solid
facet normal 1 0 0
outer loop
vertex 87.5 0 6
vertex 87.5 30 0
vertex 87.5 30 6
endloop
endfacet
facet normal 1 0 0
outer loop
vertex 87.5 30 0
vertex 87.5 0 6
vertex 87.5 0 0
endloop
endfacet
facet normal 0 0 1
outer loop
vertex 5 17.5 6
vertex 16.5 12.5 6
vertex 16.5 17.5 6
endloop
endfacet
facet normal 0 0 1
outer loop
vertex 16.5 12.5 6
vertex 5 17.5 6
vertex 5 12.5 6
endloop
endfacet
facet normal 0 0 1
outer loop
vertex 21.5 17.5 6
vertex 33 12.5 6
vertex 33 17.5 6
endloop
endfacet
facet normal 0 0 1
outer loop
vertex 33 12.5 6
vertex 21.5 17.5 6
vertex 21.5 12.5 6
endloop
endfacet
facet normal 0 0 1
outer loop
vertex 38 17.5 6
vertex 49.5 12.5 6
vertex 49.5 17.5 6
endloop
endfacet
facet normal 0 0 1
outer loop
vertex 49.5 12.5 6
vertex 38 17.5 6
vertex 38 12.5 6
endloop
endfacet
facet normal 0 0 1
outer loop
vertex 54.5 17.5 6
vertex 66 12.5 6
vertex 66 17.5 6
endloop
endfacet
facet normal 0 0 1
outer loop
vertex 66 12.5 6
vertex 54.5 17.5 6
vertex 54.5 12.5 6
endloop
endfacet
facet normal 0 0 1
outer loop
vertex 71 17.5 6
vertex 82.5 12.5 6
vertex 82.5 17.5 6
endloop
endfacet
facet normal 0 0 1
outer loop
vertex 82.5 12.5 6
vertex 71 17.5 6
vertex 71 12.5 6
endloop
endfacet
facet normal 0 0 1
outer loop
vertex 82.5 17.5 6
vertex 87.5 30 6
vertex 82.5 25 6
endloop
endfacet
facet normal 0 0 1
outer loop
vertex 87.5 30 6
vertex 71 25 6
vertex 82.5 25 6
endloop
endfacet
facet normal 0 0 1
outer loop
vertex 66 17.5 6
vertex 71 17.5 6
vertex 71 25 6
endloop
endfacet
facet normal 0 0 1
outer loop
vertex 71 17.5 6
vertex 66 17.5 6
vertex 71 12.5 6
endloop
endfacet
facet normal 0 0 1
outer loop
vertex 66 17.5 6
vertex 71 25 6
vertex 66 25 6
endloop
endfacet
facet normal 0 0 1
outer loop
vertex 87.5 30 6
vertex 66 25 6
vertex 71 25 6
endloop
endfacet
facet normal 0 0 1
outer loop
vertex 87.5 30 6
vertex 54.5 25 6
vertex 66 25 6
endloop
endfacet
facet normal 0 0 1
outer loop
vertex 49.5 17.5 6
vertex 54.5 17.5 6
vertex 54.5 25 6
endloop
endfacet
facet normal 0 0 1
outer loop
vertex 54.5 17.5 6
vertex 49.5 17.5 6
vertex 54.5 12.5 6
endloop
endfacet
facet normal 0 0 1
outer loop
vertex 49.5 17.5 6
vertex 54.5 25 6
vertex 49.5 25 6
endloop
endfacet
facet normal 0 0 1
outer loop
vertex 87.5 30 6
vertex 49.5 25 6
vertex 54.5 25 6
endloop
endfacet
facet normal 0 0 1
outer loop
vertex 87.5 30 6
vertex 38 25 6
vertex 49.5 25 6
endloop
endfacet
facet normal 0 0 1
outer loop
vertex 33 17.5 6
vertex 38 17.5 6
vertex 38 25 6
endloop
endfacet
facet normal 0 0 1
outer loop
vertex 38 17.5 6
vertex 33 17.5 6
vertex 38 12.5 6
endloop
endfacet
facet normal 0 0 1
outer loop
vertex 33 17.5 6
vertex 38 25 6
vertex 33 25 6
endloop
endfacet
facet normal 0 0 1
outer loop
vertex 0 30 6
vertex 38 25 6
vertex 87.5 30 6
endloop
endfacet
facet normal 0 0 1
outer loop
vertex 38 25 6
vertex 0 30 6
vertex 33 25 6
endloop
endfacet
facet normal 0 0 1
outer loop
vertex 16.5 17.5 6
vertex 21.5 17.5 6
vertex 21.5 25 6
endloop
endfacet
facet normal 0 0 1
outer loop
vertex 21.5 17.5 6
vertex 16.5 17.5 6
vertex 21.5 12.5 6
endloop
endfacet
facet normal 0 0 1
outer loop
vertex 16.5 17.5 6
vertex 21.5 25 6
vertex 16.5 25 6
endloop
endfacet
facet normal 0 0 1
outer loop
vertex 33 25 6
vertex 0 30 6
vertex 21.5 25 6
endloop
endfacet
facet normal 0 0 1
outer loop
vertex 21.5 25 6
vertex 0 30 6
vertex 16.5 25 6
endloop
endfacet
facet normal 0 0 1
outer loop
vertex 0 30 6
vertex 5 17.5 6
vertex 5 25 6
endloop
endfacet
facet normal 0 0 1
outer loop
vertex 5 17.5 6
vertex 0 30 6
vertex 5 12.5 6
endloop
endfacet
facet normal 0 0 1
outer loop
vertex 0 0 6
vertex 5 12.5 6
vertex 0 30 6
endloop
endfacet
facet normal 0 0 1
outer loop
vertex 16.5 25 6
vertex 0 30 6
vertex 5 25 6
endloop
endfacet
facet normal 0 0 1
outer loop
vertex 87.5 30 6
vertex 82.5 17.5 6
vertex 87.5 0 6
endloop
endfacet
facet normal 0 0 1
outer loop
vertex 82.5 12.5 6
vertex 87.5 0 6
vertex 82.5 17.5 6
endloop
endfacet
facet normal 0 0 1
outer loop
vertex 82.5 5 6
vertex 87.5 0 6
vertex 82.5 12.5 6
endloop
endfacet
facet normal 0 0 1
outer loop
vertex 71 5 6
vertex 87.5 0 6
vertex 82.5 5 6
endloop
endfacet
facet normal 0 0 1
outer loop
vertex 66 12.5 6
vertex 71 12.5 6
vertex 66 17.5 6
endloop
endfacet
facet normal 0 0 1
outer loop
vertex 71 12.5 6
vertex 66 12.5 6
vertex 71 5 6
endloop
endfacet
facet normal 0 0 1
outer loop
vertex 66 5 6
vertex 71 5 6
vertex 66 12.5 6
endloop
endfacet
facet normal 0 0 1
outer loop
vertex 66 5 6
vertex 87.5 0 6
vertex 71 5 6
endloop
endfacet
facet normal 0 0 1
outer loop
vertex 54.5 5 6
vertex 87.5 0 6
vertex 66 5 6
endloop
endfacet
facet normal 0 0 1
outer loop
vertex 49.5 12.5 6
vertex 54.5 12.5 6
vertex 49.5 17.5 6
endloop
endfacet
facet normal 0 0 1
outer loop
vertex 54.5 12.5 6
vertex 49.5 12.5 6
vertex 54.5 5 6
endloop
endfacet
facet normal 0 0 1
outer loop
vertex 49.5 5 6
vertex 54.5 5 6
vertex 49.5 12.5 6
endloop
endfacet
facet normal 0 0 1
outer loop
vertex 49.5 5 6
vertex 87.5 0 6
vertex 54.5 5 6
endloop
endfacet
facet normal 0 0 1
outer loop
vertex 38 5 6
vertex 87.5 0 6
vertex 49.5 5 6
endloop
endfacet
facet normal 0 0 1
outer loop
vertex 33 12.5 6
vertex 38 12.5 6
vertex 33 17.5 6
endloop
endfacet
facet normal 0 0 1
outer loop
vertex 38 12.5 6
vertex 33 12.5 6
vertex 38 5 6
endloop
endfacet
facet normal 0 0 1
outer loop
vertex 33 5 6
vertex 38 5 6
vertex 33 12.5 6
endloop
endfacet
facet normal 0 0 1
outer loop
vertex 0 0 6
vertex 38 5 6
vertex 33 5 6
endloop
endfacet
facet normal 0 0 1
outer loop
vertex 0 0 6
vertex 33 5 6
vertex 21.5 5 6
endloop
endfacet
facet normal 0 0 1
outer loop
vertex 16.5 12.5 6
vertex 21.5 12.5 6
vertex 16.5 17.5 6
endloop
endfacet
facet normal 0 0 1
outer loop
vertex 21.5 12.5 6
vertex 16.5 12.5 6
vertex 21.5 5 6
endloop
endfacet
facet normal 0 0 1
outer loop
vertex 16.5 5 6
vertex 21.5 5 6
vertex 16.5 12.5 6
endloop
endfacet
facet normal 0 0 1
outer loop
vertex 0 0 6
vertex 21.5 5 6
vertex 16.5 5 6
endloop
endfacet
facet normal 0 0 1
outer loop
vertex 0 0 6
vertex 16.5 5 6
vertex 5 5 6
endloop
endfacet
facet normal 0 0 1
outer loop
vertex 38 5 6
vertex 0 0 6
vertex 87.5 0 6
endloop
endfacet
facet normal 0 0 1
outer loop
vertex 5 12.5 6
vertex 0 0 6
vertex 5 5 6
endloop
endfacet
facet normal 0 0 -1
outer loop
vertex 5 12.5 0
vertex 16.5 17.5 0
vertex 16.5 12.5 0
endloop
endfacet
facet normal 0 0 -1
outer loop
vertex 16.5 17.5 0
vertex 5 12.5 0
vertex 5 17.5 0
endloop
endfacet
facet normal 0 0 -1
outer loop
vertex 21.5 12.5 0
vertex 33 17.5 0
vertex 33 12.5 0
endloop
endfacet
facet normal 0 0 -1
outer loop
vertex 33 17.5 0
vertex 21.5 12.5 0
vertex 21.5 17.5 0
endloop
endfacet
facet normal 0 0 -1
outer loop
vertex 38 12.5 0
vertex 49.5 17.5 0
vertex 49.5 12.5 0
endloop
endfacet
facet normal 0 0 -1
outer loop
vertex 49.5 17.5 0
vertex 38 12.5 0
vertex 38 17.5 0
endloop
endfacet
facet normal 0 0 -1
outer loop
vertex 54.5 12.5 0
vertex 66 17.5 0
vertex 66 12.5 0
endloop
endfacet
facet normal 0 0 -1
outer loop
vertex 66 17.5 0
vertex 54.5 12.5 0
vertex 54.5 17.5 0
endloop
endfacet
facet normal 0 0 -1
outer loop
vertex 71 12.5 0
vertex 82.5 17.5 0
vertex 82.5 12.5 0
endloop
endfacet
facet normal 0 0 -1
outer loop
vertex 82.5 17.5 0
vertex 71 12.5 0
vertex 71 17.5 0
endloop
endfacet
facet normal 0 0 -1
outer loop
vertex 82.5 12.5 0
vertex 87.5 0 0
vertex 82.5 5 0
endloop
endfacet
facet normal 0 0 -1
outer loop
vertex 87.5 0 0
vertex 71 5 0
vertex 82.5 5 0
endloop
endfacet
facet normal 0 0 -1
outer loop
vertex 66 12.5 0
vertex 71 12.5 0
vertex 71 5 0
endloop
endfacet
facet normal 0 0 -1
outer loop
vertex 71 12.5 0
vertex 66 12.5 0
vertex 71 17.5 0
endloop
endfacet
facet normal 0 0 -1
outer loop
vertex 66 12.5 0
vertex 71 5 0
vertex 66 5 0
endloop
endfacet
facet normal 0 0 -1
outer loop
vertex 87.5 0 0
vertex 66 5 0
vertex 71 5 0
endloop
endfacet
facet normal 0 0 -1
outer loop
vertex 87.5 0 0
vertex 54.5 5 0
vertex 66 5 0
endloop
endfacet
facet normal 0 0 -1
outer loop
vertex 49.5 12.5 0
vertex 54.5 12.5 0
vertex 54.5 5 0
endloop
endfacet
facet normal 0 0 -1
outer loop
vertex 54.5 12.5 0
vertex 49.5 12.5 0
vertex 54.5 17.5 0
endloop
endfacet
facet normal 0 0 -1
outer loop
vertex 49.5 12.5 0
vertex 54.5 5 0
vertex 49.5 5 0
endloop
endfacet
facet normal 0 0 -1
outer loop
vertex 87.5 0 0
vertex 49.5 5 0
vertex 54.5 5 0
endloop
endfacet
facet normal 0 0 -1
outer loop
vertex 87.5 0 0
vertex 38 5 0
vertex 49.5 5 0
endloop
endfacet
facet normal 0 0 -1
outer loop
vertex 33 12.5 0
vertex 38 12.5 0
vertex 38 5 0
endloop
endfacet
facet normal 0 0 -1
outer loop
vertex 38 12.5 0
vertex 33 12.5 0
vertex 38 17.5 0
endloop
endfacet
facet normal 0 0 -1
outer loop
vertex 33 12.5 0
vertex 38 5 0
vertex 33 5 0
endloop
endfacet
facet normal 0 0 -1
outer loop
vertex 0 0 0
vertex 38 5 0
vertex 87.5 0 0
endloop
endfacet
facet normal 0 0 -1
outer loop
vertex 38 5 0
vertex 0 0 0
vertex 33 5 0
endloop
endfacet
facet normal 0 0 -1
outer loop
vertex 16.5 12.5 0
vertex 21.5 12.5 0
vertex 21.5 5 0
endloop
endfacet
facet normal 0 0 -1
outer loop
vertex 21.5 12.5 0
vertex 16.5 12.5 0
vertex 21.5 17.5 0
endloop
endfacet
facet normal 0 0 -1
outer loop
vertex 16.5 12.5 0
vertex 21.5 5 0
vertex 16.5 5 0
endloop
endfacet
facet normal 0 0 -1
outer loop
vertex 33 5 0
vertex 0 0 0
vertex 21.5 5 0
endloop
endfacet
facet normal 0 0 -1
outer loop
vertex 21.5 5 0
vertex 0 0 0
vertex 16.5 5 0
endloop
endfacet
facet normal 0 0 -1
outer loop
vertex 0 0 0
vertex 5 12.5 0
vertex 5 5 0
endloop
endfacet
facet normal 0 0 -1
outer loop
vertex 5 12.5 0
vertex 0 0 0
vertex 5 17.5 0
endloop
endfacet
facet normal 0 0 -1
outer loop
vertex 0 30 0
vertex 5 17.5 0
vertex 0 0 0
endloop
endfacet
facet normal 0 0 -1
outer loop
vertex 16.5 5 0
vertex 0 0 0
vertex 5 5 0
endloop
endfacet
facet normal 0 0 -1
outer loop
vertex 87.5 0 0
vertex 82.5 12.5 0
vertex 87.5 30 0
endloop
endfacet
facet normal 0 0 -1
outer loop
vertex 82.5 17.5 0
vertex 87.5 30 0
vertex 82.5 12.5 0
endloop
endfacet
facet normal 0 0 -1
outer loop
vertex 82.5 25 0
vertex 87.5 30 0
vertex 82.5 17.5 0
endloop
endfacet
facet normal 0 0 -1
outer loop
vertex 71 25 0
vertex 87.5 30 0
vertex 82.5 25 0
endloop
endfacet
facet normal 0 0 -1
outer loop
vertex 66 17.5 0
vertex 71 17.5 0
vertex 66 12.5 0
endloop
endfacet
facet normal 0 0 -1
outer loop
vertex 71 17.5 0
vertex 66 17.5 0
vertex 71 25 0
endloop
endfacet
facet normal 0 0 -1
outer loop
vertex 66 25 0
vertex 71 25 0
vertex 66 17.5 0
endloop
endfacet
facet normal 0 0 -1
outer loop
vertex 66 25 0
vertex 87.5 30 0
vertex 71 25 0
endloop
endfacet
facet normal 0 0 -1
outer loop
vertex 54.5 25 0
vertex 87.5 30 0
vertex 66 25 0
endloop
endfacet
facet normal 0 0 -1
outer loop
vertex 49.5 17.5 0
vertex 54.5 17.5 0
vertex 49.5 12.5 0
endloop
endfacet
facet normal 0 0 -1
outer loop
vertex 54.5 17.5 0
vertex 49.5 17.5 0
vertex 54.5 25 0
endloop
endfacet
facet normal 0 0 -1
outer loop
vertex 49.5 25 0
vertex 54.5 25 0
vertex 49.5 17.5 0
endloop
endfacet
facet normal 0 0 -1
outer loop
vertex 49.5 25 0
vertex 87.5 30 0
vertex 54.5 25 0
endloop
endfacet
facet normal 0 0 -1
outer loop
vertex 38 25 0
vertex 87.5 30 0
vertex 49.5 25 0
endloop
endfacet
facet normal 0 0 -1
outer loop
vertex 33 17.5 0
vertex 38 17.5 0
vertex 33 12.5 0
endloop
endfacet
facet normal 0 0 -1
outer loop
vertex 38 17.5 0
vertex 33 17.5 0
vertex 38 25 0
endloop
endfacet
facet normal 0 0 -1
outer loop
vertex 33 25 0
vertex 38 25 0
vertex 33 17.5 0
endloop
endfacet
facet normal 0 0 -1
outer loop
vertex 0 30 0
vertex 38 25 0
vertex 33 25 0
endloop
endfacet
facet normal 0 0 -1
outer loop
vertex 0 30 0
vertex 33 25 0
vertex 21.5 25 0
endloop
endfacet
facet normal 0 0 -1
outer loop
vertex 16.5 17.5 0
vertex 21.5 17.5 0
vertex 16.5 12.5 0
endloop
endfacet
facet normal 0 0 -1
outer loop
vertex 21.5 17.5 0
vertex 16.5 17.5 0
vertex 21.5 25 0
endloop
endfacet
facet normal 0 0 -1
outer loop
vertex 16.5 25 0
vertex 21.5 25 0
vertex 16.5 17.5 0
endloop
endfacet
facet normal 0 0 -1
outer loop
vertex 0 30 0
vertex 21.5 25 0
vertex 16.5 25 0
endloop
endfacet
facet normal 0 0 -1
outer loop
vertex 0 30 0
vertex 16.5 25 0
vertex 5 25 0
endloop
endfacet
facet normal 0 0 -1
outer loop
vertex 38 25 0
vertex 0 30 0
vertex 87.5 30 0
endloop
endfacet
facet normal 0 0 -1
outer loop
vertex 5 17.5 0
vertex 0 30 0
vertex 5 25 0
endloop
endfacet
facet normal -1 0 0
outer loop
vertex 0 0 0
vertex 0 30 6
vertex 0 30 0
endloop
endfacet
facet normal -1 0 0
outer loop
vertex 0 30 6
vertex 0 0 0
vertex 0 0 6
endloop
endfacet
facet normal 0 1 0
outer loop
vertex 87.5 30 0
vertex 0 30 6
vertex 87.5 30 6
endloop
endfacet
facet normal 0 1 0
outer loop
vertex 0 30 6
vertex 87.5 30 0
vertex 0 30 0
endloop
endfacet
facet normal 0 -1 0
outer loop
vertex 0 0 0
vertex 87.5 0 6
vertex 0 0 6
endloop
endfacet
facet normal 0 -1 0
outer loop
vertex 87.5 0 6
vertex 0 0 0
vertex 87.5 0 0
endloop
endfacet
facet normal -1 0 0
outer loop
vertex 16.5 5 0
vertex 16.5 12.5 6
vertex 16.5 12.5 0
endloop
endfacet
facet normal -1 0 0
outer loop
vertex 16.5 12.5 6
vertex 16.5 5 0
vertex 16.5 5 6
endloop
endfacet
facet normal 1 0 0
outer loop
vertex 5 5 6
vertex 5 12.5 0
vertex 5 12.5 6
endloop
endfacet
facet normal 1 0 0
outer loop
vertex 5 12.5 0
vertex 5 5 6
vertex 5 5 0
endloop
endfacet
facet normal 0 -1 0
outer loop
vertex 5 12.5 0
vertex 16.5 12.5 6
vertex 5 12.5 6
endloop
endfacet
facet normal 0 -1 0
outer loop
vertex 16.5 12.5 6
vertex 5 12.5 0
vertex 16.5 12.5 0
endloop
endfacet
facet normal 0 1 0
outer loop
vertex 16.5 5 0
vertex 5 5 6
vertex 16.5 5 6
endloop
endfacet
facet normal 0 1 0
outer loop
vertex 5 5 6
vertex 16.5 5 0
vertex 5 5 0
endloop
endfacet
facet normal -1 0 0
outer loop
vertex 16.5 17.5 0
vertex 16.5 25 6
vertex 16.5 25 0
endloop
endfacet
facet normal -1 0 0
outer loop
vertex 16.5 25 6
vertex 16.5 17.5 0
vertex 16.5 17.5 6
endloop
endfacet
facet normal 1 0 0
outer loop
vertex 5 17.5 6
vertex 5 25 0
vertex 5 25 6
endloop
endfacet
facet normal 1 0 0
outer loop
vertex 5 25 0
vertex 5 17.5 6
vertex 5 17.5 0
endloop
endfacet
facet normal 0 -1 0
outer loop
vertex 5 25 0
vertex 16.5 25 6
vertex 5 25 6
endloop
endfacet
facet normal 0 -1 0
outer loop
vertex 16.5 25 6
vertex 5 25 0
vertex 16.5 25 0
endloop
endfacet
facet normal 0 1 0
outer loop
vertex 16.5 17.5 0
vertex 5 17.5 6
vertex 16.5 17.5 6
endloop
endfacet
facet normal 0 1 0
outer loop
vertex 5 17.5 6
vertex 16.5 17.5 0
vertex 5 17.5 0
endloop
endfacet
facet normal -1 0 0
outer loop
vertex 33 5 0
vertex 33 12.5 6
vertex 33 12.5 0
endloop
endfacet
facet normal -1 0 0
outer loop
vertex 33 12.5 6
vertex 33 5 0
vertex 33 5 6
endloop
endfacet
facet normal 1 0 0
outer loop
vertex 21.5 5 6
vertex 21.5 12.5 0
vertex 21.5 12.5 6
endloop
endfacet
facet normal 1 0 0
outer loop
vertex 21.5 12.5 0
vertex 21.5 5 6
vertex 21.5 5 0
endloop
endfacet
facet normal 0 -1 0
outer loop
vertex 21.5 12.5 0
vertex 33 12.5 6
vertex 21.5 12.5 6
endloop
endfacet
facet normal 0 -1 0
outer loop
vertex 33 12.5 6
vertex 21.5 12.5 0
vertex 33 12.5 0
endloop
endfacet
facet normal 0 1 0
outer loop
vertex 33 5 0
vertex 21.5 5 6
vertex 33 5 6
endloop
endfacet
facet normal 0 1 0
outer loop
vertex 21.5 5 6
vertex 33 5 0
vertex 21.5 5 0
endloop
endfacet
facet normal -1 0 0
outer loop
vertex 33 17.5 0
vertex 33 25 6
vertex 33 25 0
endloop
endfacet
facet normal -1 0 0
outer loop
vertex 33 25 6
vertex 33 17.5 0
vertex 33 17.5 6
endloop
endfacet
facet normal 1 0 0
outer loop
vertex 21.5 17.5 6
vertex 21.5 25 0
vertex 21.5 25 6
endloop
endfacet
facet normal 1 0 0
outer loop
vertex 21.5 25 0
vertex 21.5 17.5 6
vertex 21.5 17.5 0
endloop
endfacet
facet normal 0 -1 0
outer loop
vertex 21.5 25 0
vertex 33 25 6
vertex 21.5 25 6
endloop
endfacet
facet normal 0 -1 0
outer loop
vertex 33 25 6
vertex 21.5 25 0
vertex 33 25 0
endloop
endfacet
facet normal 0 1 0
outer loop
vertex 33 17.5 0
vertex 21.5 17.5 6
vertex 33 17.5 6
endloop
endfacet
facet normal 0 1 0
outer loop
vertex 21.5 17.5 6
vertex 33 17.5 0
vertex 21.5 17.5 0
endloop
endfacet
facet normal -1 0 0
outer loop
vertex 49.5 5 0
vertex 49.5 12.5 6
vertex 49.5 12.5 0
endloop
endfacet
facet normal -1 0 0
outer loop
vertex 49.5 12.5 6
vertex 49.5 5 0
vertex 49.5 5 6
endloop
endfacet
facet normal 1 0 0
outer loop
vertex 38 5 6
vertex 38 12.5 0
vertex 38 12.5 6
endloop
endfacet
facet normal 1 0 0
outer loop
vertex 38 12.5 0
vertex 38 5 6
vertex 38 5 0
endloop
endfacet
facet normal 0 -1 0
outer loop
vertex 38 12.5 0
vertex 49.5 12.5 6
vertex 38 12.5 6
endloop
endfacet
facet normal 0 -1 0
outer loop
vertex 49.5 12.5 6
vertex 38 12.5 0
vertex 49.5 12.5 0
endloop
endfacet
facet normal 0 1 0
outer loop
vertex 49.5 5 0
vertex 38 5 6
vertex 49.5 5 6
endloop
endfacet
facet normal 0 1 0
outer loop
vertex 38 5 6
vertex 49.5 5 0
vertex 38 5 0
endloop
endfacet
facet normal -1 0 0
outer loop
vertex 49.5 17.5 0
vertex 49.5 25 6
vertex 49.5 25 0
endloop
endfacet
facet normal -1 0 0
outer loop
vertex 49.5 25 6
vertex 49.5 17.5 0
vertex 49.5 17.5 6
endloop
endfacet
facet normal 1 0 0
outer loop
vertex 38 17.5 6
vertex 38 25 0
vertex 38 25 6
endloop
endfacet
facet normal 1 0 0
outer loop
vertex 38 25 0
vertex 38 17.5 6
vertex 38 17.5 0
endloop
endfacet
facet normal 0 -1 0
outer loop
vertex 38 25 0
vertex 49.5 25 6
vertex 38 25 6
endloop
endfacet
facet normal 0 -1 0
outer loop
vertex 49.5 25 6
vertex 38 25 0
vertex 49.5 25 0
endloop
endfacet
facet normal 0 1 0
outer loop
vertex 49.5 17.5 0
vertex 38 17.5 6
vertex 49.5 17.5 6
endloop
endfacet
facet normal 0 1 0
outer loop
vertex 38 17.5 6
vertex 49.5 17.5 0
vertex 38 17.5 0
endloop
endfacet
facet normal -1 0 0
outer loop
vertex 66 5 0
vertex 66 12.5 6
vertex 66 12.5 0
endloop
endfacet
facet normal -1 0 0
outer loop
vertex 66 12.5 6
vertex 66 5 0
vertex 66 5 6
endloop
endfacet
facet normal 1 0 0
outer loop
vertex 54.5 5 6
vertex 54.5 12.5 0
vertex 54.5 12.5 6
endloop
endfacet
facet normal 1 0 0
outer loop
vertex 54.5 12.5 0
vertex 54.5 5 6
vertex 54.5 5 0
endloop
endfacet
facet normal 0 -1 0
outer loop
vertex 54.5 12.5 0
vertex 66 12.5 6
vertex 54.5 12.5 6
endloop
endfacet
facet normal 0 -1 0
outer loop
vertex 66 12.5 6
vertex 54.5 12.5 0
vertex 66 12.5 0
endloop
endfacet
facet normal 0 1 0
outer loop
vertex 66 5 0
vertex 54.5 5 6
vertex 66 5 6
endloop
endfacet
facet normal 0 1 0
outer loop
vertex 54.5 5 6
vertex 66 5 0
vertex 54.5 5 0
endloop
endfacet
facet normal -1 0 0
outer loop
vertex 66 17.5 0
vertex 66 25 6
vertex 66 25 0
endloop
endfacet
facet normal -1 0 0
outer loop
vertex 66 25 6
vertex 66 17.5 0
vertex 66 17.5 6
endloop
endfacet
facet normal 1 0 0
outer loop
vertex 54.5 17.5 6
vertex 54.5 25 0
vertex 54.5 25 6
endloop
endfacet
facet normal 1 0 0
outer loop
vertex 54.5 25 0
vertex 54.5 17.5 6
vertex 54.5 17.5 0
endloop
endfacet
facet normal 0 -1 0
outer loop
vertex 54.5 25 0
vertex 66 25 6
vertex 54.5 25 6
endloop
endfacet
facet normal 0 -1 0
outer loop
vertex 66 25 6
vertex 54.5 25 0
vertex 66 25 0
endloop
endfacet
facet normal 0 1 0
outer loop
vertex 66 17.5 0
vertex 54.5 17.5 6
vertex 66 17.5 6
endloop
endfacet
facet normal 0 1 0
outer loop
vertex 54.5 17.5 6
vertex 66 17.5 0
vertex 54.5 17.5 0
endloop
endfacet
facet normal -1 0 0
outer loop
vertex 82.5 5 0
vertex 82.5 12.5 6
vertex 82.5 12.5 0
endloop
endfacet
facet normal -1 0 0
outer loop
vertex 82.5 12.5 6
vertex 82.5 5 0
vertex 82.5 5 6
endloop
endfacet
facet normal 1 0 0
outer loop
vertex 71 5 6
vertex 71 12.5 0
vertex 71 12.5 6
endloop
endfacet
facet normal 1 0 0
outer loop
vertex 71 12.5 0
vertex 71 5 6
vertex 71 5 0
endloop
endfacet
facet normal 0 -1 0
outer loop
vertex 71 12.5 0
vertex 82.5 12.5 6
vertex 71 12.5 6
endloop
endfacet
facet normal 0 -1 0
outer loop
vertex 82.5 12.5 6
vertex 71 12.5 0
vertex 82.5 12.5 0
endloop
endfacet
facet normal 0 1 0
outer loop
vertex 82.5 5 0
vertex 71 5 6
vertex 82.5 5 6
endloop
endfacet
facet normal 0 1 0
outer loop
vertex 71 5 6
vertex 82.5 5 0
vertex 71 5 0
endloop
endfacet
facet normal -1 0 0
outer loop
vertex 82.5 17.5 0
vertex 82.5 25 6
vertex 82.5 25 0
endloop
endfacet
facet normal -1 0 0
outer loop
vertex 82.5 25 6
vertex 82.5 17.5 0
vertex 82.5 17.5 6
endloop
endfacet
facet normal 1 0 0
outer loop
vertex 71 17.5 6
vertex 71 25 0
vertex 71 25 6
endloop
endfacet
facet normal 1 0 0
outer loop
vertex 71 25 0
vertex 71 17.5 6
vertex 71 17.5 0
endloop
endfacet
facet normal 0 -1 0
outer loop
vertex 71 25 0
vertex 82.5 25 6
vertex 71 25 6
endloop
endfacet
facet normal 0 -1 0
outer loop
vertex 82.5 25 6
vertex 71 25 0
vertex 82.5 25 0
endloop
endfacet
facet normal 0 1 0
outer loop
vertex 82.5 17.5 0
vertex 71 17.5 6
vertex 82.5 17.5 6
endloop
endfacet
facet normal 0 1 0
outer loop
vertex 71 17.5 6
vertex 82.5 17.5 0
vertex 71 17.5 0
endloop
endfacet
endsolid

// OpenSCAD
difference () {
  translate ([43.75, 15.0, 3]) {
    cube ([87.5, 30.0, 6], center=true);
  }
  translate ([5.0, 5.0, 0]) {
    translate ([5.75, 3.75, 0]) {
      cube ([11.5, 7.5, 1000], center=true);
    }
  }
  translate ([5.0, 17.5, 0]) {
    translate ([5.75, 3.75, 0]) {
      cube ([11.5, 7.5, 1000], center=true);
    }
  }
  translate ([21.5, 5.0, 0]) {
    translate ([5.75, 3.75, 0]) {
      cube ([11.5, 7.5, 1000], center=true);
    }
  }
  translate ([21.5, 17.5, 0]) {
    translate ([5.75, 3.75, 0]) {
      cube ([11.5, 7.5, 1000], center=true);
    }
  }
  translate ([38.0, 5.0, 0]) {
    translate ([5.75, 3.75, 0]) {
      cube ([11.5, 7.5, 1000], center=true);
    }
  }
  translate ([38.0, 17.5, 0]) {
    translate ([5.75, 3.75, 0]) {
      cube ([11.5, 7.5, 1000], center=true);
    }
  }
  translate ([54.5, 5.0, 0]) {
    translate ([5.75, 3.75, 0]) {
      cube ([11.5, 7.5, 1000], center=true);
    }
  }
  translate ([54.5, 17.5, 0]) {
    translate ([5.75, 3.75, 0]) {
      cube ([11.5, 7.5, 1000], center=true);
    }
  }
  translate ([71.0, 5.0, 0]) {
    translate ([5.75, 3.75, 0]) {
      cube ([11.5, 7.5, 1000], center=true);
    }
  }
  translate ([71.0, 17.5, 0]) {
    translate ([5.75, 3.75, 0]) {
      cube ([11.5, 7.5, 1000], center=true);
    }
  }
}
